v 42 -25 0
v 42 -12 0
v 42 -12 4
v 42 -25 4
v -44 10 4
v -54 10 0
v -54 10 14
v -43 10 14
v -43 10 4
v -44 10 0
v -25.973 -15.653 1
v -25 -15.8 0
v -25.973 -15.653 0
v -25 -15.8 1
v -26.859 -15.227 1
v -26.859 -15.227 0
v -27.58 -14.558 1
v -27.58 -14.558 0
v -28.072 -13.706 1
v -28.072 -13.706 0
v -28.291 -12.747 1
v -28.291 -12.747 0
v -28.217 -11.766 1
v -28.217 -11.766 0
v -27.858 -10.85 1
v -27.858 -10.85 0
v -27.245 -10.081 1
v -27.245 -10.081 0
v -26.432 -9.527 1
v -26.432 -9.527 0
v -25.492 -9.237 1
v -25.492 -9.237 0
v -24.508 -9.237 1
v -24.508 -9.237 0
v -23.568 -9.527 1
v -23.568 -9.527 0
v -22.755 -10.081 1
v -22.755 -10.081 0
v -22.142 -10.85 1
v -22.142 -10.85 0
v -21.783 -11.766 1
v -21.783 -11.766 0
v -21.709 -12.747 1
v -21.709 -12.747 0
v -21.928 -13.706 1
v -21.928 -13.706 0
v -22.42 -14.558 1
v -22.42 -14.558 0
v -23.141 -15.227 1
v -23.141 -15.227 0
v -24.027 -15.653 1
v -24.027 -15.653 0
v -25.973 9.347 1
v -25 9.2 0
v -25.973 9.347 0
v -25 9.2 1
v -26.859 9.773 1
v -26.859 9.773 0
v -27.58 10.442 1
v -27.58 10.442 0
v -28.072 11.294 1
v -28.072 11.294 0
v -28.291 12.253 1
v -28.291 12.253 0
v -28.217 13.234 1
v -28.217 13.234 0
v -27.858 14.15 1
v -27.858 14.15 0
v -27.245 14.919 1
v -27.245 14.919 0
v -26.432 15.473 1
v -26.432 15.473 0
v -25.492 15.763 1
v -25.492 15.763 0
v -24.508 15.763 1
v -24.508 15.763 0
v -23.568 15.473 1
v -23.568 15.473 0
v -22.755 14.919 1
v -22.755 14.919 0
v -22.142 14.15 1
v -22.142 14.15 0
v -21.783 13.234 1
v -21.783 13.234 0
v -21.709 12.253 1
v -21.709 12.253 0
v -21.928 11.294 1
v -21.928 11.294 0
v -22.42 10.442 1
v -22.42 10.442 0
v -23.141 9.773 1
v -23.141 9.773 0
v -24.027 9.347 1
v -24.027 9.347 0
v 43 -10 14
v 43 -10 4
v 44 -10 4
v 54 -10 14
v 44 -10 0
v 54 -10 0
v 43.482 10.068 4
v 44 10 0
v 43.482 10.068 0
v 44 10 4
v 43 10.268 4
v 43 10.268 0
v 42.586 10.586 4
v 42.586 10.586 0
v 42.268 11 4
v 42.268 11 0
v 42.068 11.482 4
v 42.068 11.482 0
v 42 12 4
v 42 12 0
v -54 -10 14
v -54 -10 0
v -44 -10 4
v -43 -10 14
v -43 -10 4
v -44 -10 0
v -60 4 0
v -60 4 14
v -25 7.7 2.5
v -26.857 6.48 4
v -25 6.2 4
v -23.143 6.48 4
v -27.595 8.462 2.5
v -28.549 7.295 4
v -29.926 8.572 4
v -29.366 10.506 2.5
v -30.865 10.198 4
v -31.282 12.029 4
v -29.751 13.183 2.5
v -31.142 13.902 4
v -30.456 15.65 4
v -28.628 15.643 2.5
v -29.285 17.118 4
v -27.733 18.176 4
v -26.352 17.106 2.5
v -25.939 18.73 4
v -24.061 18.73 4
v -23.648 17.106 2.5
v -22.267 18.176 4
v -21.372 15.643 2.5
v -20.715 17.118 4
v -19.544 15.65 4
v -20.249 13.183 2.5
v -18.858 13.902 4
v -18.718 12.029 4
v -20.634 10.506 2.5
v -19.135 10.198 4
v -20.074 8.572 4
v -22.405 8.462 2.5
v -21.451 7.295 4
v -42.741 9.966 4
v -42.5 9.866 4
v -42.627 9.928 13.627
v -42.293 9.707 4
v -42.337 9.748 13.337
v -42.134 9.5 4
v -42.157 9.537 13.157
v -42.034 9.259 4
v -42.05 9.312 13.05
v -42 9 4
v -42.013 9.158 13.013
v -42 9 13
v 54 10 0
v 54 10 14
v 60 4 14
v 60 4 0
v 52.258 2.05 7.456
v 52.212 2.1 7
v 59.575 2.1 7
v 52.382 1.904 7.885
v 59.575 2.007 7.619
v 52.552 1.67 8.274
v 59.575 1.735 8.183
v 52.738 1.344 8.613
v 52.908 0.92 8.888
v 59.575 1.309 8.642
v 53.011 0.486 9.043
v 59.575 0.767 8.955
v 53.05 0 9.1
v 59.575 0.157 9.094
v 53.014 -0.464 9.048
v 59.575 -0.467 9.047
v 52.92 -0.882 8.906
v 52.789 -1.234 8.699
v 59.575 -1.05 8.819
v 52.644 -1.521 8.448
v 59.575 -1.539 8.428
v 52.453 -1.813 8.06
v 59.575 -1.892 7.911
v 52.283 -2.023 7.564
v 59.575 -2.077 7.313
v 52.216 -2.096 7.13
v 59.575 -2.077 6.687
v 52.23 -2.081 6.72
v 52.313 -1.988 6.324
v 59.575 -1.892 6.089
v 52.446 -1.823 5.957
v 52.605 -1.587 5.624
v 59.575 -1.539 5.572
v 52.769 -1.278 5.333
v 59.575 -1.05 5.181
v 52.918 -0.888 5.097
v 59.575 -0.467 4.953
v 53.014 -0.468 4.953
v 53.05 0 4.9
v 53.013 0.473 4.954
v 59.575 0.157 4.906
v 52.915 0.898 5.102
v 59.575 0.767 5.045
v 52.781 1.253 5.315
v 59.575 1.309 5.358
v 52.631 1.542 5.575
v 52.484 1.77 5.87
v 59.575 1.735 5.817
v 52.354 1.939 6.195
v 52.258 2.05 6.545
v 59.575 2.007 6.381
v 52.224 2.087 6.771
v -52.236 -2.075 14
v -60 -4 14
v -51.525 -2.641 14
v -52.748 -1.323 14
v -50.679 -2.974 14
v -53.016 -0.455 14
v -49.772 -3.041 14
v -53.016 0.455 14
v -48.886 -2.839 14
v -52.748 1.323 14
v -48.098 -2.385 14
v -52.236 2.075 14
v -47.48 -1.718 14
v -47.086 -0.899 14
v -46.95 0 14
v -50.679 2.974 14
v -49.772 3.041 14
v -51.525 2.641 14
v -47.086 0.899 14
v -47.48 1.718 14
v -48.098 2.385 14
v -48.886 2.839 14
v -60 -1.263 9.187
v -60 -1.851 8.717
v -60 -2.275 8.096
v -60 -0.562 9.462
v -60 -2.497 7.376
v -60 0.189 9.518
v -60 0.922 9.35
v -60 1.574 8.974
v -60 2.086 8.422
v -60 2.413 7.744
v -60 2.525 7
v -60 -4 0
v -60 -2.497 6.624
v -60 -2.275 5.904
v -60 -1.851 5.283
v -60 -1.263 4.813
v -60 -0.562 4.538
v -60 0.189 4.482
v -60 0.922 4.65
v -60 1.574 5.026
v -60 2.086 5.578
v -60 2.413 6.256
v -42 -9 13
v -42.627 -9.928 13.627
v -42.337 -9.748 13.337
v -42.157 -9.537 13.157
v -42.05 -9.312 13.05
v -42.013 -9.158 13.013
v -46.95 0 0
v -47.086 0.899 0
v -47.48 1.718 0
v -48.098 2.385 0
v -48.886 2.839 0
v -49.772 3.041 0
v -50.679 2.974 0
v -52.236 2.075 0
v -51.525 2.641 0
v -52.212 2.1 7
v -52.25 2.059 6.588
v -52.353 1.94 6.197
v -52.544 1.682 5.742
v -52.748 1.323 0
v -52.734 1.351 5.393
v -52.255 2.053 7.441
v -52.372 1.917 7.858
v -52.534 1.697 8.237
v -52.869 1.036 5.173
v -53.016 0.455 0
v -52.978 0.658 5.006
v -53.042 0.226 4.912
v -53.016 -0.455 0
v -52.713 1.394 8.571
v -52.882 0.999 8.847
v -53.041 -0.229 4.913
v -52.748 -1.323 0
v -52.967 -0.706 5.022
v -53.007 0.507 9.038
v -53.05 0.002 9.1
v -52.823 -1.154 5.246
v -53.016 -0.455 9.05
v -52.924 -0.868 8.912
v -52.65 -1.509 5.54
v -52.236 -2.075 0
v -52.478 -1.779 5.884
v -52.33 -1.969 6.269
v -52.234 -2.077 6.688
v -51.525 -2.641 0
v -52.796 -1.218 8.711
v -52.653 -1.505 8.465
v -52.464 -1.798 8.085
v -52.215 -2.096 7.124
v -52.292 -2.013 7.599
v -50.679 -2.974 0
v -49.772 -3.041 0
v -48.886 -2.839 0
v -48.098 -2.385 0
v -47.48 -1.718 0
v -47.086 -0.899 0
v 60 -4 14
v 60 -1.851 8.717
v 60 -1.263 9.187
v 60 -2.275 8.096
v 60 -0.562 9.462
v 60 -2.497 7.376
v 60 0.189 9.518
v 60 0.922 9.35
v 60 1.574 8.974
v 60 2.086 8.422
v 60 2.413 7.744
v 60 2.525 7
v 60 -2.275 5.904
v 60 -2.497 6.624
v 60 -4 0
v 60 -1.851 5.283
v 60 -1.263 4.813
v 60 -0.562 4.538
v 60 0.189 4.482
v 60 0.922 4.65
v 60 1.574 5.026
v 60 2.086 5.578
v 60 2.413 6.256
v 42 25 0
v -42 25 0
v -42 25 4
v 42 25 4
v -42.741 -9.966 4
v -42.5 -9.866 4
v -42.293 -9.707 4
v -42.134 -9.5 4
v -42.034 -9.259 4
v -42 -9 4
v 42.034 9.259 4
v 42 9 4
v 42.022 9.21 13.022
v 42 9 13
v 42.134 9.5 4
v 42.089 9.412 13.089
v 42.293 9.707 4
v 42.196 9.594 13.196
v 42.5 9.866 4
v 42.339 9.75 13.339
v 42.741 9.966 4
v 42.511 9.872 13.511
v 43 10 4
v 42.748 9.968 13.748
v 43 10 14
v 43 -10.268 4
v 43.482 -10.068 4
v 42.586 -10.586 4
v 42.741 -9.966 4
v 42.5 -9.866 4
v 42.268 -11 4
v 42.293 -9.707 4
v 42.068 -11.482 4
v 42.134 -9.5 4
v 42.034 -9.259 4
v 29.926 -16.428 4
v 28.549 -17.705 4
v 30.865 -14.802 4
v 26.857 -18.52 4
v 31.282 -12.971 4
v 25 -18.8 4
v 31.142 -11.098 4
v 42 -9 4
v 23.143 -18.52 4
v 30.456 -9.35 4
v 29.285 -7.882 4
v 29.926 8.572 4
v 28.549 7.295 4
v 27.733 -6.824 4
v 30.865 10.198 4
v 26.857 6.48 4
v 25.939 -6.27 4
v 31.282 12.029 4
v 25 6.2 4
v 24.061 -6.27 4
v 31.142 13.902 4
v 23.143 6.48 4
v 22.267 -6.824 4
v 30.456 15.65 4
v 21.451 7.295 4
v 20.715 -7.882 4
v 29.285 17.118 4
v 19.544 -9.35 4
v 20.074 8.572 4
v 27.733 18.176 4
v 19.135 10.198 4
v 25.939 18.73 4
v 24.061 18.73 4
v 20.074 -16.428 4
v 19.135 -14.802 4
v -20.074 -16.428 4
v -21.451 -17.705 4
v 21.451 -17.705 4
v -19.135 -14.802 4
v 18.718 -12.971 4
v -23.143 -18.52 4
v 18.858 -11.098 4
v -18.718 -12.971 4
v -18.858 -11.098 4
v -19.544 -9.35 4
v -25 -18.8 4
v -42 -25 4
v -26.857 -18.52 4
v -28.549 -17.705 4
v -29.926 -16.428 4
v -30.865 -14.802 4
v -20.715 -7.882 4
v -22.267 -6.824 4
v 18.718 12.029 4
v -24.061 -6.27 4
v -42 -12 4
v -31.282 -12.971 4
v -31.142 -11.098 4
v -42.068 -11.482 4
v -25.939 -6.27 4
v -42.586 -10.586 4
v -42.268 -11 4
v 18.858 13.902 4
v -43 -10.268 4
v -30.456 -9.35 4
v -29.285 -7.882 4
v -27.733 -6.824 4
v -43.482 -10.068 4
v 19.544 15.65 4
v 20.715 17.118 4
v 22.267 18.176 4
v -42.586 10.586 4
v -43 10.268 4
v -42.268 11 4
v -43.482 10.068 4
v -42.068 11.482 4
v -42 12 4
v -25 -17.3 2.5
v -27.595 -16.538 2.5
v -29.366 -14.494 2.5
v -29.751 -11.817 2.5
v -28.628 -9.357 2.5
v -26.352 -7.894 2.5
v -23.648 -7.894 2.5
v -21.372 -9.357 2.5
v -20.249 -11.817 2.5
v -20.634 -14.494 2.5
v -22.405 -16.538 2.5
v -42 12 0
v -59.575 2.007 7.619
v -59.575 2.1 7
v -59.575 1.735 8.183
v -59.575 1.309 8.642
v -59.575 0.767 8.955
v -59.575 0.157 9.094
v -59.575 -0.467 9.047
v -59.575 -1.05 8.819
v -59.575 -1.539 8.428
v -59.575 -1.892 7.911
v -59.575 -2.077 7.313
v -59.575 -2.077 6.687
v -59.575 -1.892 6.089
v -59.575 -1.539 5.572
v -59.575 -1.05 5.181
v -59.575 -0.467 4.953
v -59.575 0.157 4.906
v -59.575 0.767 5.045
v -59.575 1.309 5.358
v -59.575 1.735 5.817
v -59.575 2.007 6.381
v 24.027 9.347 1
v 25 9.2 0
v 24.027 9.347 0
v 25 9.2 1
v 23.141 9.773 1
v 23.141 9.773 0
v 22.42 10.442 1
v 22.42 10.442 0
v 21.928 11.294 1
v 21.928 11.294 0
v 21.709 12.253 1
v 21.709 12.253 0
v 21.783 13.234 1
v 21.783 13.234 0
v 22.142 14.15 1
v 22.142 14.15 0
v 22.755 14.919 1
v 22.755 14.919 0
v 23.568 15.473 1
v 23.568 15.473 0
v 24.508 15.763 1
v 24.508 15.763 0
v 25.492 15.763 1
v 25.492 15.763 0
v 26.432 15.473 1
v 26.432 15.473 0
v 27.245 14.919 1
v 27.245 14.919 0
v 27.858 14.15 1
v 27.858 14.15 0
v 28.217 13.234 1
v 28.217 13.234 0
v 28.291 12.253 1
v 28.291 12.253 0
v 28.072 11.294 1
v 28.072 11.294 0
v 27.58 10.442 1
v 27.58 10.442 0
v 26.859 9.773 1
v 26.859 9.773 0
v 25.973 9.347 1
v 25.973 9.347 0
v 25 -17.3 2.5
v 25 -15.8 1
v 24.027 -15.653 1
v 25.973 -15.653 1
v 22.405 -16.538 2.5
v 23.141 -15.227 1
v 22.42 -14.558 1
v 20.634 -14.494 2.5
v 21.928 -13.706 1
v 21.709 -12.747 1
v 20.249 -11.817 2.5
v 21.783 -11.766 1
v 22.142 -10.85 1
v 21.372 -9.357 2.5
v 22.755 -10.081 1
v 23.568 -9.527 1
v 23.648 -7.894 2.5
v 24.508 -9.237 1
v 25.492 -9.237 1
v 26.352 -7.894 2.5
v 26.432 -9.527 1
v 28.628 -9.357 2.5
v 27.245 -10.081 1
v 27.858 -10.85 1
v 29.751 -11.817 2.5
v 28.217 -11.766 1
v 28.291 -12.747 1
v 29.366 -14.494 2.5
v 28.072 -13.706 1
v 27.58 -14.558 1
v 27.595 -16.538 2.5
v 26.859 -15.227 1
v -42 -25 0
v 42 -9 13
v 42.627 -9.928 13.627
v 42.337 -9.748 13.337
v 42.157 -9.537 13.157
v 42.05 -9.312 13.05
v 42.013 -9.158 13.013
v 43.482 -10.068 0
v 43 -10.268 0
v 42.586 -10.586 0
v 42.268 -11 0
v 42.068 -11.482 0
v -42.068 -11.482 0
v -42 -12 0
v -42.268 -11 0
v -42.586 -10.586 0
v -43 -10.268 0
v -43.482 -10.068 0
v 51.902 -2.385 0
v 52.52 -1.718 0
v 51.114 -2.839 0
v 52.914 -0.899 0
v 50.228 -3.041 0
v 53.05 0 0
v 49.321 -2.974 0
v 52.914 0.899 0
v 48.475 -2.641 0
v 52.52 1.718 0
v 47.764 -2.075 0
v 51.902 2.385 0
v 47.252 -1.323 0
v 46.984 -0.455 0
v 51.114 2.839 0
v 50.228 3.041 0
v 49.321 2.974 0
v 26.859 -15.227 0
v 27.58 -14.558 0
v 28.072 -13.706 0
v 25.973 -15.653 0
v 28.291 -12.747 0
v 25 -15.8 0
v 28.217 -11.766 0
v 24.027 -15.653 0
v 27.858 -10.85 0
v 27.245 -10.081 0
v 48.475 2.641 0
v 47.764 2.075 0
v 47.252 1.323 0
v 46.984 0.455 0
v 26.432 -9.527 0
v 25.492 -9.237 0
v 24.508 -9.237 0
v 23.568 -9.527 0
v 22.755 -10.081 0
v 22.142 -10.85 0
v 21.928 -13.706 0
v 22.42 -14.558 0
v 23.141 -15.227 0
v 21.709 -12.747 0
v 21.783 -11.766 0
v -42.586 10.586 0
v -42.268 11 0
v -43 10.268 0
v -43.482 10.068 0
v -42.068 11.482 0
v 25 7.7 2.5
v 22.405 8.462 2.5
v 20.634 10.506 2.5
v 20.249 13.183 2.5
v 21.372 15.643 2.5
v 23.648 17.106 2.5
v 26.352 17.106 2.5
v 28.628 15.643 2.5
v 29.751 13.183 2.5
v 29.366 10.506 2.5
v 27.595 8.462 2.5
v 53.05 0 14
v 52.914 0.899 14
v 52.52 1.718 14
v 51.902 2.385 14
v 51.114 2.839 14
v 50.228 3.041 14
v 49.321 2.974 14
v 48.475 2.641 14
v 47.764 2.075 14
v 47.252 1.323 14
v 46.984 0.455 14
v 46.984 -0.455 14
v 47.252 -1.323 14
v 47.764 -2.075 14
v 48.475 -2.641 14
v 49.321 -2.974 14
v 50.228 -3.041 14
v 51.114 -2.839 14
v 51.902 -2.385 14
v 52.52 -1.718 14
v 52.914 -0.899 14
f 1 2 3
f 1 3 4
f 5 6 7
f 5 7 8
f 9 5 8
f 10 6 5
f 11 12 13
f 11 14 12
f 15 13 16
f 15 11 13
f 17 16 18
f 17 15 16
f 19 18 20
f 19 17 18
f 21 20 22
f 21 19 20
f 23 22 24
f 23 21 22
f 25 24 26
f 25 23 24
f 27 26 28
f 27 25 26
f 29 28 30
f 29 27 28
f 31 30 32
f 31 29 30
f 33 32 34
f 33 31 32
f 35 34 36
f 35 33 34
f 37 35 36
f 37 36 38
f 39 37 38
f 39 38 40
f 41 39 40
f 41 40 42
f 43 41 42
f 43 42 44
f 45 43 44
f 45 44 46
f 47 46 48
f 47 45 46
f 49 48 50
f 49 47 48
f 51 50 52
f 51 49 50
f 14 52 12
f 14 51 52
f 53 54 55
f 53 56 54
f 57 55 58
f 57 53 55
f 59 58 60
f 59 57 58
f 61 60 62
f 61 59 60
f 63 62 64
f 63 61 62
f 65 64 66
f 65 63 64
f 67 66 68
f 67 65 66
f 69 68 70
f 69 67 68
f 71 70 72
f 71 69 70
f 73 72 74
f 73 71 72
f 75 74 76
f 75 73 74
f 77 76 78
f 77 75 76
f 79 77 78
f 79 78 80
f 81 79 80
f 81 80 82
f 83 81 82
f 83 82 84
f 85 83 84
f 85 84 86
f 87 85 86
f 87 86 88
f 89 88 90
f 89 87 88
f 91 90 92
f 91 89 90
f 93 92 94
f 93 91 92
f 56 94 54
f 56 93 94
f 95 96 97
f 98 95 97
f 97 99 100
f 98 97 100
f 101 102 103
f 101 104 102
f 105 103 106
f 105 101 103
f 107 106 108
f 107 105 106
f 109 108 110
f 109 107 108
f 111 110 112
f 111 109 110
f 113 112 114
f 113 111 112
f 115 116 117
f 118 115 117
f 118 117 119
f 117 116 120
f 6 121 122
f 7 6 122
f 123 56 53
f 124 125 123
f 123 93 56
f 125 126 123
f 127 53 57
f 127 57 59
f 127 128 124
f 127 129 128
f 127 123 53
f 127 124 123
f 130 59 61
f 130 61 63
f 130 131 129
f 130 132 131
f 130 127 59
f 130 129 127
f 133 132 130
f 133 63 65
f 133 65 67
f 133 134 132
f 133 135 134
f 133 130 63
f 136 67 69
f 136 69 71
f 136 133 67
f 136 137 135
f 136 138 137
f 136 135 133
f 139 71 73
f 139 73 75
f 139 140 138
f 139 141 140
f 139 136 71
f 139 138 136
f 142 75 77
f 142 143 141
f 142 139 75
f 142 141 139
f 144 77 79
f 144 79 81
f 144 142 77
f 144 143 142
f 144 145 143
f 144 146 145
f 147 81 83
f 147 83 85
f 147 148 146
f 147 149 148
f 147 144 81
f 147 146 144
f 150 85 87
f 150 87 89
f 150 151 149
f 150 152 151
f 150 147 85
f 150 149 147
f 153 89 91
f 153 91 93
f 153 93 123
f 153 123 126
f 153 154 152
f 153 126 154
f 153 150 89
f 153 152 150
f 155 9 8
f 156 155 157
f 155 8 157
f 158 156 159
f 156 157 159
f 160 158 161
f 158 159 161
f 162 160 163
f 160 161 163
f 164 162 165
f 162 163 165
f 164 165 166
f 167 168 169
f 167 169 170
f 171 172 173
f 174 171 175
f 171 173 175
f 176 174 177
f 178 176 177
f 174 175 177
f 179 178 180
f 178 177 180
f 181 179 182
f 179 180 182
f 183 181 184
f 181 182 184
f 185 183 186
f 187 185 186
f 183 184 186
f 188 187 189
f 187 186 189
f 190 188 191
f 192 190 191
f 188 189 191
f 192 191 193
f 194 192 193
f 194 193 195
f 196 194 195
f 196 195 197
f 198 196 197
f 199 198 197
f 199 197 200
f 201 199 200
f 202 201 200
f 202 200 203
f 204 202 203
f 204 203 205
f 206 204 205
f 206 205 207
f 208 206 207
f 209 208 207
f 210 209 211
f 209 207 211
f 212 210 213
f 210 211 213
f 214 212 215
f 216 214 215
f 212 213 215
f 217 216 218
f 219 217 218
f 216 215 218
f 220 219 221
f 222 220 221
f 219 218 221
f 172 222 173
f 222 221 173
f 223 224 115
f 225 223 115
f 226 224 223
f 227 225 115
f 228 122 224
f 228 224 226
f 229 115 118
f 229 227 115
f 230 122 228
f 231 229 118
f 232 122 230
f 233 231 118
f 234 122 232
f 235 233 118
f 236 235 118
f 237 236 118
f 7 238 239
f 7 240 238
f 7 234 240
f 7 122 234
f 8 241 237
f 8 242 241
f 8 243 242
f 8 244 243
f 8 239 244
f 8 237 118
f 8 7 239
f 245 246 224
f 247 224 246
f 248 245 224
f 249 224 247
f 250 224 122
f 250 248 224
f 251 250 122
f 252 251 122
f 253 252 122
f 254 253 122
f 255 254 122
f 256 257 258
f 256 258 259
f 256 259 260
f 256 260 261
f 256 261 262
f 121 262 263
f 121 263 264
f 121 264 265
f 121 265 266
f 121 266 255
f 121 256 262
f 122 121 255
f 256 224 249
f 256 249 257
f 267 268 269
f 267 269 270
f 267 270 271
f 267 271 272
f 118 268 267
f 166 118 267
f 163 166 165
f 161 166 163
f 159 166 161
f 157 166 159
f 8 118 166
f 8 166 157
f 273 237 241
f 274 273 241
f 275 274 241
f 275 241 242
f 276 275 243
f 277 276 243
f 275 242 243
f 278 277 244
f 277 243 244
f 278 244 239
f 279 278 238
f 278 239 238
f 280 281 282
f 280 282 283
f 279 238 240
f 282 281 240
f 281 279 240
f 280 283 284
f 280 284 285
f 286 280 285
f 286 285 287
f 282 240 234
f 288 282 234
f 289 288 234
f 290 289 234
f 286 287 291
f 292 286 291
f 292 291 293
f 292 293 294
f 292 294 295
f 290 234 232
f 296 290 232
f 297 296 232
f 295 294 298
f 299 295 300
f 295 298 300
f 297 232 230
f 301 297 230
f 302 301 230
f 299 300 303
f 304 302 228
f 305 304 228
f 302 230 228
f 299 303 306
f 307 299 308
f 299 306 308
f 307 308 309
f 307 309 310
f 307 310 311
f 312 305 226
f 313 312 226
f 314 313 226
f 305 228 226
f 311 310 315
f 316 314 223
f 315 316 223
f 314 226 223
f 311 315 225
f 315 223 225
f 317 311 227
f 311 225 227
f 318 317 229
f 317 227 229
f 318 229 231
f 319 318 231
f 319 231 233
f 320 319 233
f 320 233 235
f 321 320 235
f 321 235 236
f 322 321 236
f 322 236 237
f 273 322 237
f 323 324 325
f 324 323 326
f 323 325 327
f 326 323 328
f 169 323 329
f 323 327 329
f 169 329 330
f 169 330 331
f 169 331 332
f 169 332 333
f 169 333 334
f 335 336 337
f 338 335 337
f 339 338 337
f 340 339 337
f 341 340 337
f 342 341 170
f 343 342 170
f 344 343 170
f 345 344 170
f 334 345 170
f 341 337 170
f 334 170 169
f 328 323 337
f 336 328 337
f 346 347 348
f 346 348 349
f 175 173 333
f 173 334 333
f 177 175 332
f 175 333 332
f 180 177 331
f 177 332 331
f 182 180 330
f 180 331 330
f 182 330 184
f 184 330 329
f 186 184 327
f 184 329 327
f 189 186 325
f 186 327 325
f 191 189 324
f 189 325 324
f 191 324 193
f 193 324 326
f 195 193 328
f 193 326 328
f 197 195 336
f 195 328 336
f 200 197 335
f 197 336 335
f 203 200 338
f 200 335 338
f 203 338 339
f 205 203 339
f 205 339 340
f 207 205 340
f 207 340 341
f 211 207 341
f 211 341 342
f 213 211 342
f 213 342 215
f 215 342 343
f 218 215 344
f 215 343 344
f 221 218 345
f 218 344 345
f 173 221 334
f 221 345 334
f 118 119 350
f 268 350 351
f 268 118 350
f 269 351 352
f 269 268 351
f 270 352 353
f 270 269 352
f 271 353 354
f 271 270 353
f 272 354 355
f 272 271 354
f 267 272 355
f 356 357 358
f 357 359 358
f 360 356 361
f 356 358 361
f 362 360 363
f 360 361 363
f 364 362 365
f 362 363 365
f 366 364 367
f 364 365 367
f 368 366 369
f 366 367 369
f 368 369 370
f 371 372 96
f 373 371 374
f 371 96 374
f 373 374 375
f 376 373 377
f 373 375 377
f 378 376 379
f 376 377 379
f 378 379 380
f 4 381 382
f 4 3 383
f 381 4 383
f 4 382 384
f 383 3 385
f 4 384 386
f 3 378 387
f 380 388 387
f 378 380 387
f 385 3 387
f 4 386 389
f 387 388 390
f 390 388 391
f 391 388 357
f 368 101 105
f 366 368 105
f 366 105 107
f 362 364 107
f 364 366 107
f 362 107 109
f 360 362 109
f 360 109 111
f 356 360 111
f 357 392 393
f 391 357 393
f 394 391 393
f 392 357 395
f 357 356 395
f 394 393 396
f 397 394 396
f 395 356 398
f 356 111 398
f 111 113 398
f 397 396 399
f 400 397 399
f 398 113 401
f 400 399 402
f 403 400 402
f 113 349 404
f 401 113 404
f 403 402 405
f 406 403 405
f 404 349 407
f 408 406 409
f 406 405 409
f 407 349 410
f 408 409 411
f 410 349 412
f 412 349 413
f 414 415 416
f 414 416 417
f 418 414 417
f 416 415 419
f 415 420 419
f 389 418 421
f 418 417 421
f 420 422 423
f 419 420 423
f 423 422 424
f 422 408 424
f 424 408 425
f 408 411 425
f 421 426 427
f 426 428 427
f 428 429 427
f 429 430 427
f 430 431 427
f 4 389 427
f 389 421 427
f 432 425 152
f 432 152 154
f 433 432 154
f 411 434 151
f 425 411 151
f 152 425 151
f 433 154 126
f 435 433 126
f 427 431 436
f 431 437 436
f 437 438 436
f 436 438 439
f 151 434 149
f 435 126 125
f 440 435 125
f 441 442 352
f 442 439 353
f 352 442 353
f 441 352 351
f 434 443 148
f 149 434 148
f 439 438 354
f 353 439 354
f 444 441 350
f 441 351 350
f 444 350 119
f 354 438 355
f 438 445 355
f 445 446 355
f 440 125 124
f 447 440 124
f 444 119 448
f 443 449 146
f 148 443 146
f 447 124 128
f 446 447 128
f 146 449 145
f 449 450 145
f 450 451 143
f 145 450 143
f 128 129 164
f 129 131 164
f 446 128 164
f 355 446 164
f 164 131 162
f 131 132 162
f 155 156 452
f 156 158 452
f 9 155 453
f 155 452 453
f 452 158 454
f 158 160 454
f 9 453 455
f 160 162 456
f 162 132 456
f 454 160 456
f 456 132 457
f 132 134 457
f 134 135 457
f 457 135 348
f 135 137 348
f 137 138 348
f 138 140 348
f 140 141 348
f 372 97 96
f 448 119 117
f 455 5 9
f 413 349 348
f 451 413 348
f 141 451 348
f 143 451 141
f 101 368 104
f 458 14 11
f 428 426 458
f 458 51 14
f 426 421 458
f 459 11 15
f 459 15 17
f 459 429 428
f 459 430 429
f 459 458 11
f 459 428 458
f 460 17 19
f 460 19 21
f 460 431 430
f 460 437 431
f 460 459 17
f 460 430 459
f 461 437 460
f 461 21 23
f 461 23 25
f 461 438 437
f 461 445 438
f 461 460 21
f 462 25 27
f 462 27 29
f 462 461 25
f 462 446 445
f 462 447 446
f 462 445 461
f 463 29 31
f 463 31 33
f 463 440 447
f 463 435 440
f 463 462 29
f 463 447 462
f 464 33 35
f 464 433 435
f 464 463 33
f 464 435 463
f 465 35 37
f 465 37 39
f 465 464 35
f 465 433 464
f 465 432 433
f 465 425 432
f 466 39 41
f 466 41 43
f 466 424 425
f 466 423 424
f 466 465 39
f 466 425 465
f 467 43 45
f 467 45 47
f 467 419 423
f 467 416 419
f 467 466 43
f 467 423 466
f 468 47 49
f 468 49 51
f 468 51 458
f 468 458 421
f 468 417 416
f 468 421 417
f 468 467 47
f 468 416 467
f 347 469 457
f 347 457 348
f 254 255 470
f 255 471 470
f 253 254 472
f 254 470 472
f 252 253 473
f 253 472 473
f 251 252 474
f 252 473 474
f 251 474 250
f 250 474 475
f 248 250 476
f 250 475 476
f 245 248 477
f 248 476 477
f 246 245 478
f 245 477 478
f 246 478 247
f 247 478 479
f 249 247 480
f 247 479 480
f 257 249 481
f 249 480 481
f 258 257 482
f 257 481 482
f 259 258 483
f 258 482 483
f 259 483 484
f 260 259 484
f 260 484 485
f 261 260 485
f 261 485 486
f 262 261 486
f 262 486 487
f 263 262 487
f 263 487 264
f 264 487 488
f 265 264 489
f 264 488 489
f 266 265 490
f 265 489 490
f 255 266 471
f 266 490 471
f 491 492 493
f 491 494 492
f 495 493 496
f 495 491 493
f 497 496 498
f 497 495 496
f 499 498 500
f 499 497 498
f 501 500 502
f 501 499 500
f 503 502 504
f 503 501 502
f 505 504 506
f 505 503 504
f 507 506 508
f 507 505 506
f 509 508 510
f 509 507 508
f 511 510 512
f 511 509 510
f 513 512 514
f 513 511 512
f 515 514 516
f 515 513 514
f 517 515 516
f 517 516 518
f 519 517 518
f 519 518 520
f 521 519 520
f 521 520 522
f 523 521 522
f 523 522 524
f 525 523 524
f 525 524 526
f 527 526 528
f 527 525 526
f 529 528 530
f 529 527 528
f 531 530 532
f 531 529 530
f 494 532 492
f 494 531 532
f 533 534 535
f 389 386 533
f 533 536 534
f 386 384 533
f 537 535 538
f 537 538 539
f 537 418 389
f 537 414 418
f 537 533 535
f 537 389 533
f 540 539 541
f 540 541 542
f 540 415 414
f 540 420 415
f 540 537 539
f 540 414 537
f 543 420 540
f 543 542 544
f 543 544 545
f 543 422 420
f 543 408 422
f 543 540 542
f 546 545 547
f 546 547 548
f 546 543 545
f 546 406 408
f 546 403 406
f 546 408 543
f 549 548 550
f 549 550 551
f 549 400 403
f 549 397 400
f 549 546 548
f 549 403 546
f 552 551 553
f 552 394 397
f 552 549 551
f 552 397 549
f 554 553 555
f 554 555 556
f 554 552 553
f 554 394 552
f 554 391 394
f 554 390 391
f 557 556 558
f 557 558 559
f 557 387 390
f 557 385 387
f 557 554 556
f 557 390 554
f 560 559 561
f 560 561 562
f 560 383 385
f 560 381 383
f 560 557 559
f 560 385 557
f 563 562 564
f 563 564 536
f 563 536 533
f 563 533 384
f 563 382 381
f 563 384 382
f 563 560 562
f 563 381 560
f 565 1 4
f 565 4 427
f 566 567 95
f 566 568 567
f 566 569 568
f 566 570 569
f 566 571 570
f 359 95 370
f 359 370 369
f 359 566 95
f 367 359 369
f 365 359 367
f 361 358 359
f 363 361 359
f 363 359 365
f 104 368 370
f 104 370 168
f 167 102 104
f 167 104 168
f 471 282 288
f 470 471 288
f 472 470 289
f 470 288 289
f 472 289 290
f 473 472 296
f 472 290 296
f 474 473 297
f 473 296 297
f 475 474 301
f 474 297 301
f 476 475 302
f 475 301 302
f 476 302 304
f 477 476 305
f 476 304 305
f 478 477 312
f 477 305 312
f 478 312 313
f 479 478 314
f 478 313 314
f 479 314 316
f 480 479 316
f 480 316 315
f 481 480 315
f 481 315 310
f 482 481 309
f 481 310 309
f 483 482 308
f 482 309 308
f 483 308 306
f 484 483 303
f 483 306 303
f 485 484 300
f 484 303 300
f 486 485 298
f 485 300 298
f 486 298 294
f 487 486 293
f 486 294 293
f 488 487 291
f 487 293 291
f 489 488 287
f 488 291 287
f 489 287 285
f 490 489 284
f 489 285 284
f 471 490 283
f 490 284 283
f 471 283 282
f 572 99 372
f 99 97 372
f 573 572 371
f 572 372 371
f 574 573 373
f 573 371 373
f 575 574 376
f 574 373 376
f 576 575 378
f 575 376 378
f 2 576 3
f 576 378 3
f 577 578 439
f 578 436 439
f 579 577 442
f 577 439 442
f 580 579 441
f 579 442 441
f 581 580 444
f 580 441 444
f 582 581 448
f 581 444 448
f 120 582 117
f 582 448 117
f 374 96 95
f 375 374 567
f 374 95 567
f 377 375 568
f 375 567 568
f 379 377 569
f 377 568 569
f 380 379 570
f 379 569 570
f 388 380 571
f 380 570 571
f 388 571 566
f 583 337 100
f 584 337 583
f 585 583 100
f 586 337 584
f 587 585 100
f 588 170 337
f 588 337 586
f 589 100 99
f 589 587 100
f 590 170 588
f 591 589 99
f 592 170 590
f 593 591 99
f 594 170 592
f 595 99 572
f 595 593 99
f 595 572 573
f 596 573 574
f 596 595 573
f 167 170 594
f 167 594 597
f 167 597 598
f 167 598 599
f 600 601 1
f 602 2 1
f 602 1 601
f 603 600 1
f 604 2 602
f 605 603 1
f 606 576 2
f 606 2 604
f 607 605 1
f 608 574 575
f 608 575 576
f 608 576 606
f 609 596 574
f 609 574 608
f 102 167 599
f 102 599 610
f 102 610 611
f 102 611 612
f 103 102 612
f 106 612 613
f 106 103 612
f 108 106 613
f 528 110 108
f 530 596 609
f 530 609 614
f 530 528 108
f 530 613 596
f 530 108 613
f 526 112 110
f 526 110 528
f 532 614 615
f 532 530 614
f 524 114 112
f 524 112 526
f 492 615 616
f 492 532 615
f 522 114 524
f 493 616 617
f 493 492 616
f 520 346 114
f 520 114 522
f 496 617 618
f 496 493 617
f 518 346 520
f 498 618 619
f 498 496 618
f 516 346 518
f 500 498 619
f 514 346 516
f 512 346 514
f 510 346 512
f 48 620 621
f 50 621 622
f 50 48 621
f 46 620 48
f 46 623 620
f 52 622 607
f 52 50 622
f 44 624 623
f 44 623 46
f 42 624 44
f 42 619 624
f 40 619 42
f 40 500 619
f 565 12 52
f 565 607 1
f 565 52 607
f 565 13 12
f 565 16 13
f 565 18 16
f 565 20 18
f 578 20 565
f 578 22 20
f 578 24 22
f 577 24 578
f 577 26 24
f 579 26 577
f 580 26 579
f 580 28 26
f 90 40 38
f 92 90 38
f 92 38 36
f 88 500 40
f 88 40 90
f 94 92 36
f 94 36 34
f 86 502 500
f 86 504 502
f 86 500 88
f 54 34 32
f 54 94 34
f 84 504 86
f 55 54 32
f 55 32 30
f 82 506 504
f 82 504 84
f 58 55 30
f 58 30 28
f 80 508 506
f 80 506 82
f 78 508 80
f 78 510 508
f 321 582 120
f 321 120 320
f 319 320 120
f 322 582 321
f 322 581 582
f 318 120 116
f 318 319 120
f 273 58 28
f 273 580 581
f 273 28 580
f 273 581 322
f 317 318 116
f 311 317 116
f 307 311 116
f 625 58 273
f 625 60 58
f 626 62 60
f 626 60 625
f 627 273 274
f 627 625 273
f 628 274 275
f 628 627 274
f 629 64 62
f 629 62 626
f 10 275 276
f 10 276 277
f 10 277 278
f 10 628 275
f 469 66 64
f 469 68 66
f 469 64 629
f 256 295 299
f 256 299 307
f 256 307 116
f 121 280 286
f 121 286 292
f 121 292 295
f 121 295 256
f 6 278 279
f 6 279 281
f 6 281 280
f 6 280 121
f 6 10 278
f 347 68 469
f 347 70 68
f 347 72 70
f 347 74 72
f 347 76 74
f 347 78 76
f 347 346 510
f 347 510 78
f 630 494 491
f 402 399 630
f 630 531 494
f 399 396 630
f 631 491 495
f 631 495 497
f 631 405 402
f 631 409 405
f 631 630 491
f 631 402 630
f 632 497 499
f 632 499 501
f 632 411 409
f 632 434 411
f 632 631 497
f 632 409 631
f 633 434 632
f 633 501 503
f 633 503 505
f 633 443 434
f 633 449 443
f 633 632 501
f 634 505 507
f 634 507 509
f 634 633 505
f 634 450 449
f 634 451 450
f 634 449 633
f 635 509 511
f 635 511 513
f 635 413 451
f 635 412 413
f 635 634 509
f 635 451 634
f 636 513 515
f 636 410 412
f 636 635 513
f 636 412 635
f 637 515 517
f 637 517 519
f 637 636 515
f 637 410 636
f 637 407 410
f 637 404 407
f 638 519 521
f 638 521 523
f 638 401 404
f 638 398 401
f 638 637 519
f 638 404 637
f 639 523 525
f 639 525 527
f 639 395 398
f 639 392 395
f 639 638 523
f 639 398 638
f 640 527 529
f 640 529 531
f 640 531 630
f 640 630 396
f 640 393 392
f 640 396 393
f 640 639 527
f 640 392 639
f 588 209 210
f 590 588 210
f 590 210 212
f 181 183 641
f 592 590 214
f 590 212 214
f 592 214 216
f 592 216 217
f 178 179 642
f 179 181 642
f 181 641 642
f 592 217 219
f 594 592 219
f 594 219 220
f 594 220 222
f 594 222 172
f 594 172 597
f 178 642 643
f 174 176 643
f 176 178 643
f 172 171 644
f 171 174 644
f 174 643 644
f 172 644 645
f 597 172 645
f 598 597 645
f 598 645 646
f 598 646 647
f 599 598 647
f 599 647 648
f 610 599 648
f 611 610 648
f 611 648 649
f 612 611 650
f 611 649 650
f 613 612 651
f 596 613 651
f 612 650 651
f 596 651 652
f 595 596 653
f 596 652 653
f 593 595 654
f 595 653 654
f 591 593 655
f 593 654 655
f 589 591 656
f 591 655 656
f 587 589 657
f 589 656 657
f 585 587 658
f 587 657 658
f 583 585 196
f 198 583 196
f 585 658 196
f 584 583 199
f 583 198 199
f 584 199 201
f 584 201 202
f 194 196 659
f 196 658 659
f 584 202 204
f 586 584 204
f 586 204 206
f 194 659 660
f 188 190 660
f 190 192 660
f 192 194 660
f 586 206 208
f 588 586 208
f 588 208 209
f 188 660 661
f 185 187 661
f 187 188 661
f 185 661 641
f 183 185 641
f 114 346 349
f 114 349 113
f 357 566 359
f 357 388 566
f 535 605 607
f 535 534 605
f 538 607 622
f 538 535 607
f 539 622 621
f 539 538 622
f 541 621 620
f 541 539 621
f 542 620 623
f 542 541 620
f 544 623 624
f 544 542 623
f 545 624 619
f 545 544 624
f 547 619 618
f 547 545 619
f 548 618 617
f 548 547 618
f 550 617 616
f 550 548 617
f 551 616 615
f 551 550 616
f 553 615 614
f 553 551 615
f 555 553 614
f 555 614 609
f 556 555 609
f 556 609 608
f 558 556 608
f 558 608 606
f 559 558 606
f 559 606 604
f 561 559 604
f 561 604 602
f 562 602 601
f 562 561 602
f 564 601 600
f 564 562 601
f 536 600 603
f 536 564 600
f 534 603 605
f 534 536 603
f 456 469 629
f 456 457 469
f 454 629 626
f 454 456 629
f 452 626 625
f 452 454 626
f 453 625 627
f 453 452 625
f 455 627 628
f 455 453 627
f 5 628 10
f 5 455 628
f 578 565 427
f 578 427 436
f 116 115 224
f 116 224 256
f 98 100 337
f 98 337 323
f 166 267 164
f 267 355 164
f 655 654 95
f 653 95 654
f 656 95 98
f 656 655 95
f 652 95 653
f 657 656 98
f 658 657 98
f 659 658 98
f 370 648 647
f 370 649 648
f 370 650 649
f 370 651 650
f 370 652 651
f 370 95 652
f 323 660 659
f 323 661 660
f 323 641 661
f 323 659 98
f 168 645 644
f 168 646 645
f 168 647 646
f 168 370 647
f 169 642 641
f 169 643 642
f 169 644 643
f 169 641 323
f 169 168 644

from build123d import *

# Parameters (mm, degrees)
BOSS_EXTRUDE1_DEPTH                          = 4
CSK_FOR_M6_COUNTERSUNK_FLAT_HEAD_SCR_2_COUNT = 2
CSK_FOR_M6_COUNTERSUNK_FLAT_HEAD_SCR_2_PITCH = 25
CSK_FOR_M6_COUNTERSUNK_FLAT_HEAD_SCR_3_COUNT = 2
CSK_FOR_M6_COUNTERSUNK_FLAT_HEAD_SCR_3_PITCH = 55.901699437
CSK_FOR_M6_COUNTERSUNK_FLAT_HEAD_SCR_4_COUNT = 2
CSK_FOR_M6_COUNTERSUNK_FLAT_HEAD_SCR_4_PITCH = 50
SKETCH11_W                                   = 18
SKETCH11_H                                   = 20
BOSS_EXTRUDE4_DEPTH                          = 10
CHAMFER1_SIZE                                = 6
CUT_EXTRUDE5_REACH                           = 68.491
SKETCH12_R                                   = 3.05
FILLET2_R                                    = 2
CHAMFER2_SIZE                                = 1
FILLET3_R                                    = 1


# Read off the part's stored shape, not the designer's step: M5 Tapped Hole1
with BuildPart() as part:
    # Sketch1 → Boss-Extrude1 (new body)
    with BuildSketch(Plane.XY):
        Polygon((42, -25), (-42, -25), (-42, -10), (-60, -10), (-60, 10), (-42, 10), (-42, 25), (42, 25), (42, 10), (60, 10), (60, -10), (42, -10), align=None)
    extrude(amount=BOSS_EXTRUDE1_DEPTH)

    # Sketch10 → CSK for M6 Countersunk Flat Head Screw3 (revolve, cut)
    with BuildSketch(Plane(origin=(25, 12.5, 4), x_dir=(0, -1, 0), z_dir=(1, 0, 0))):
        Polygon((0, 0), (0, 4), (3.3, 4), (3.3, 3), (6.3, 0), align=None)
    csk_for_m6_countersunk_flat_head_screw3 = revolve(axis=Axis((25, 12.5, 10.35), (0, 0, -1)), mode=Mode.SUBTRACT)

    # CSK for M6 Countersunk Flat Head Scr 2: CSK for M6 Countersunk Flat Head Screw3 ×2
    with Locations(*[(0, -i * CSK_FOR_M6_COUNTERSUNK_FLAT_HEAD_SCR_2_PITCH, 0) for i in range(1, CSK_FOR_M6_COUNTERSUNK_FLAT_HEAD_SCR_2_COUNT)]):
        add(csk_for_m6_countersunk_flat_head_screw3, mode=Mode.SUBTRACT)

    # CSK for M6 Countersunk Flat Head Scr 3: CSK for M6 Countersunk Flat Head Screw3 ×2
    with Locations(*[Vector(-0.894427190999916, -0.447213595499958, 0) * (i * CSK_FOR_M6_COUNTERSUNK_FLAT_HEAD_SCR_3_PITCH) for i in range(1, CSK_FOR_M6_COUNTERSUNK_FLAT_HEAD_SCR_3_COUNT)]):
        add(csk_for_m6_countersunk_flat_head_screw3, mode=Mode.SUBTRACT)

    # CSK for M6 Countersunk Flat Head Scr 4: CSK for M6 Countersunk Flat Head Screw3 ×2
    with Locations(*[(-i * CSK_FOR_M6_COUNTERSUNK_FLAT_HEAD_SCR_4_PITCH, 0, 0) for i in range(1, CSK_FOR_M6_COUNTERSUNK_FLAT_HEAD_SCR_4_COUNT)]):
        add(csk_for_m6_countersunk_flat_head_screw3, mode=Mode.SUBTRACT)

    # Sketch11 → Boss-Extrude4 (add)
    with BuildSketch(Plane.XY.offset(4)):
        with Locations((51, 0)):
            Rectangle(SKETCH11_W, SKETCH11_H)
        with Locations((-51, 0)):
            Rectangle(SKETCH11_W, SKETCH11_H)
    extrude(amount=BOSS_EXTRUDE4_DEPTH)

    # Chamfer1
    chamfer1_edges = [part.edges().sort_by_distance(p)[0] for p in [
        (60, 10, 7),
        (60, -10, 7),
        (-60, -10, 7),
        (-60, 10, 7),
    ]]
    chamfer(chamfer1_edges, length=CHAMFER1_SIZE)

    # Sketch12 → Cut-Extrude5 (cut, up to next)
    with BuildSketch(Plane.XY.offset(14), mode=Mode.PRIVATE) as cut_extrude5_sk1:
        with Locations((50, 0)):
            Circle(SKETCH12_R)
    cut_extrude5_tool1 = extrude(cut_extrude5_sk1.sketch, amount=-CUT_EXTRUDE5_REACH, mode=Mode.PRIVATE) & part.part
    # Sketch12 → Cut-Extrude5 (cut, up to next)
    with BuildSketch(Plane.XY.offset(14), mode=Mode.PRIVATE) as cut_extrude5_sk2:
        with Locations((-50, 0)):
            Circle(SKETCH12_R)
    cut_extrude5_tool2 = extrude(cut_extrude5_sk2.sketch, amount=-CUT_EXTRUDE5_REACH, mode=Mode.PRIVATE) & part.part
    add(cut_extrude5_tool1.solids().sort_by_distance((50, 0, 14))[0], mode=Mode.SUBTRACT)
    add(cut_extrude5_tool2.solids().sort_by_distance((-50, 0, 14))[0], mode=Mode.SUBTRACT)

    # Fillet2
    fillet2_edges = [part.edges().sort_by_distance(p)[0] for p in [
        (42, 10, 2),
        (42, -10, 2),
        (-42, -10, 2),
        (-42, 10, 2),
    ]]
    fillet(fillet2_edges, radius=FILLET2_R)

    # Chamfer2
    chamfer2_edges = [part.edges().sort_by_distance(p)[0] for p in [
        (42, 0, 14),
        (-42, 0, 14),
    ]]
    chamfer(chamfer2_edges, length=CHAMFER2_SIZE)

    # Fillet3
    fillet3_edges = [part.edges().sort_by_distance(p)[0] for p in [
        (42, 10, 8.5),
        (42, -10, 8.5),
        (-42, 10, 8.5),
        (-42, -10, 8.5),
    ]]
    fillet(fillet3_edges, radius=FILLET3_R)

    # M5 Tapped Hole1 outline → M5 Tapped Hole1 (revolve, cut)
    with BuildSketch(Plane.YX.offset(-7)):
        Polygon((2.1, -59.575), (2.1, -52.211448723), (0, -52.211448723), (0, -60), (2.525, -60), align=None)
        Polygon((0, 52.211448731), (2.1, 52.211448731), (2.1, 59.575), (2.525, 60), (0, 60), align=None)
    revolve(axis=Axis((0, 0, 7), (1, 0, 0)), mode=Mode.SUBTRACT)


solid = part.part
